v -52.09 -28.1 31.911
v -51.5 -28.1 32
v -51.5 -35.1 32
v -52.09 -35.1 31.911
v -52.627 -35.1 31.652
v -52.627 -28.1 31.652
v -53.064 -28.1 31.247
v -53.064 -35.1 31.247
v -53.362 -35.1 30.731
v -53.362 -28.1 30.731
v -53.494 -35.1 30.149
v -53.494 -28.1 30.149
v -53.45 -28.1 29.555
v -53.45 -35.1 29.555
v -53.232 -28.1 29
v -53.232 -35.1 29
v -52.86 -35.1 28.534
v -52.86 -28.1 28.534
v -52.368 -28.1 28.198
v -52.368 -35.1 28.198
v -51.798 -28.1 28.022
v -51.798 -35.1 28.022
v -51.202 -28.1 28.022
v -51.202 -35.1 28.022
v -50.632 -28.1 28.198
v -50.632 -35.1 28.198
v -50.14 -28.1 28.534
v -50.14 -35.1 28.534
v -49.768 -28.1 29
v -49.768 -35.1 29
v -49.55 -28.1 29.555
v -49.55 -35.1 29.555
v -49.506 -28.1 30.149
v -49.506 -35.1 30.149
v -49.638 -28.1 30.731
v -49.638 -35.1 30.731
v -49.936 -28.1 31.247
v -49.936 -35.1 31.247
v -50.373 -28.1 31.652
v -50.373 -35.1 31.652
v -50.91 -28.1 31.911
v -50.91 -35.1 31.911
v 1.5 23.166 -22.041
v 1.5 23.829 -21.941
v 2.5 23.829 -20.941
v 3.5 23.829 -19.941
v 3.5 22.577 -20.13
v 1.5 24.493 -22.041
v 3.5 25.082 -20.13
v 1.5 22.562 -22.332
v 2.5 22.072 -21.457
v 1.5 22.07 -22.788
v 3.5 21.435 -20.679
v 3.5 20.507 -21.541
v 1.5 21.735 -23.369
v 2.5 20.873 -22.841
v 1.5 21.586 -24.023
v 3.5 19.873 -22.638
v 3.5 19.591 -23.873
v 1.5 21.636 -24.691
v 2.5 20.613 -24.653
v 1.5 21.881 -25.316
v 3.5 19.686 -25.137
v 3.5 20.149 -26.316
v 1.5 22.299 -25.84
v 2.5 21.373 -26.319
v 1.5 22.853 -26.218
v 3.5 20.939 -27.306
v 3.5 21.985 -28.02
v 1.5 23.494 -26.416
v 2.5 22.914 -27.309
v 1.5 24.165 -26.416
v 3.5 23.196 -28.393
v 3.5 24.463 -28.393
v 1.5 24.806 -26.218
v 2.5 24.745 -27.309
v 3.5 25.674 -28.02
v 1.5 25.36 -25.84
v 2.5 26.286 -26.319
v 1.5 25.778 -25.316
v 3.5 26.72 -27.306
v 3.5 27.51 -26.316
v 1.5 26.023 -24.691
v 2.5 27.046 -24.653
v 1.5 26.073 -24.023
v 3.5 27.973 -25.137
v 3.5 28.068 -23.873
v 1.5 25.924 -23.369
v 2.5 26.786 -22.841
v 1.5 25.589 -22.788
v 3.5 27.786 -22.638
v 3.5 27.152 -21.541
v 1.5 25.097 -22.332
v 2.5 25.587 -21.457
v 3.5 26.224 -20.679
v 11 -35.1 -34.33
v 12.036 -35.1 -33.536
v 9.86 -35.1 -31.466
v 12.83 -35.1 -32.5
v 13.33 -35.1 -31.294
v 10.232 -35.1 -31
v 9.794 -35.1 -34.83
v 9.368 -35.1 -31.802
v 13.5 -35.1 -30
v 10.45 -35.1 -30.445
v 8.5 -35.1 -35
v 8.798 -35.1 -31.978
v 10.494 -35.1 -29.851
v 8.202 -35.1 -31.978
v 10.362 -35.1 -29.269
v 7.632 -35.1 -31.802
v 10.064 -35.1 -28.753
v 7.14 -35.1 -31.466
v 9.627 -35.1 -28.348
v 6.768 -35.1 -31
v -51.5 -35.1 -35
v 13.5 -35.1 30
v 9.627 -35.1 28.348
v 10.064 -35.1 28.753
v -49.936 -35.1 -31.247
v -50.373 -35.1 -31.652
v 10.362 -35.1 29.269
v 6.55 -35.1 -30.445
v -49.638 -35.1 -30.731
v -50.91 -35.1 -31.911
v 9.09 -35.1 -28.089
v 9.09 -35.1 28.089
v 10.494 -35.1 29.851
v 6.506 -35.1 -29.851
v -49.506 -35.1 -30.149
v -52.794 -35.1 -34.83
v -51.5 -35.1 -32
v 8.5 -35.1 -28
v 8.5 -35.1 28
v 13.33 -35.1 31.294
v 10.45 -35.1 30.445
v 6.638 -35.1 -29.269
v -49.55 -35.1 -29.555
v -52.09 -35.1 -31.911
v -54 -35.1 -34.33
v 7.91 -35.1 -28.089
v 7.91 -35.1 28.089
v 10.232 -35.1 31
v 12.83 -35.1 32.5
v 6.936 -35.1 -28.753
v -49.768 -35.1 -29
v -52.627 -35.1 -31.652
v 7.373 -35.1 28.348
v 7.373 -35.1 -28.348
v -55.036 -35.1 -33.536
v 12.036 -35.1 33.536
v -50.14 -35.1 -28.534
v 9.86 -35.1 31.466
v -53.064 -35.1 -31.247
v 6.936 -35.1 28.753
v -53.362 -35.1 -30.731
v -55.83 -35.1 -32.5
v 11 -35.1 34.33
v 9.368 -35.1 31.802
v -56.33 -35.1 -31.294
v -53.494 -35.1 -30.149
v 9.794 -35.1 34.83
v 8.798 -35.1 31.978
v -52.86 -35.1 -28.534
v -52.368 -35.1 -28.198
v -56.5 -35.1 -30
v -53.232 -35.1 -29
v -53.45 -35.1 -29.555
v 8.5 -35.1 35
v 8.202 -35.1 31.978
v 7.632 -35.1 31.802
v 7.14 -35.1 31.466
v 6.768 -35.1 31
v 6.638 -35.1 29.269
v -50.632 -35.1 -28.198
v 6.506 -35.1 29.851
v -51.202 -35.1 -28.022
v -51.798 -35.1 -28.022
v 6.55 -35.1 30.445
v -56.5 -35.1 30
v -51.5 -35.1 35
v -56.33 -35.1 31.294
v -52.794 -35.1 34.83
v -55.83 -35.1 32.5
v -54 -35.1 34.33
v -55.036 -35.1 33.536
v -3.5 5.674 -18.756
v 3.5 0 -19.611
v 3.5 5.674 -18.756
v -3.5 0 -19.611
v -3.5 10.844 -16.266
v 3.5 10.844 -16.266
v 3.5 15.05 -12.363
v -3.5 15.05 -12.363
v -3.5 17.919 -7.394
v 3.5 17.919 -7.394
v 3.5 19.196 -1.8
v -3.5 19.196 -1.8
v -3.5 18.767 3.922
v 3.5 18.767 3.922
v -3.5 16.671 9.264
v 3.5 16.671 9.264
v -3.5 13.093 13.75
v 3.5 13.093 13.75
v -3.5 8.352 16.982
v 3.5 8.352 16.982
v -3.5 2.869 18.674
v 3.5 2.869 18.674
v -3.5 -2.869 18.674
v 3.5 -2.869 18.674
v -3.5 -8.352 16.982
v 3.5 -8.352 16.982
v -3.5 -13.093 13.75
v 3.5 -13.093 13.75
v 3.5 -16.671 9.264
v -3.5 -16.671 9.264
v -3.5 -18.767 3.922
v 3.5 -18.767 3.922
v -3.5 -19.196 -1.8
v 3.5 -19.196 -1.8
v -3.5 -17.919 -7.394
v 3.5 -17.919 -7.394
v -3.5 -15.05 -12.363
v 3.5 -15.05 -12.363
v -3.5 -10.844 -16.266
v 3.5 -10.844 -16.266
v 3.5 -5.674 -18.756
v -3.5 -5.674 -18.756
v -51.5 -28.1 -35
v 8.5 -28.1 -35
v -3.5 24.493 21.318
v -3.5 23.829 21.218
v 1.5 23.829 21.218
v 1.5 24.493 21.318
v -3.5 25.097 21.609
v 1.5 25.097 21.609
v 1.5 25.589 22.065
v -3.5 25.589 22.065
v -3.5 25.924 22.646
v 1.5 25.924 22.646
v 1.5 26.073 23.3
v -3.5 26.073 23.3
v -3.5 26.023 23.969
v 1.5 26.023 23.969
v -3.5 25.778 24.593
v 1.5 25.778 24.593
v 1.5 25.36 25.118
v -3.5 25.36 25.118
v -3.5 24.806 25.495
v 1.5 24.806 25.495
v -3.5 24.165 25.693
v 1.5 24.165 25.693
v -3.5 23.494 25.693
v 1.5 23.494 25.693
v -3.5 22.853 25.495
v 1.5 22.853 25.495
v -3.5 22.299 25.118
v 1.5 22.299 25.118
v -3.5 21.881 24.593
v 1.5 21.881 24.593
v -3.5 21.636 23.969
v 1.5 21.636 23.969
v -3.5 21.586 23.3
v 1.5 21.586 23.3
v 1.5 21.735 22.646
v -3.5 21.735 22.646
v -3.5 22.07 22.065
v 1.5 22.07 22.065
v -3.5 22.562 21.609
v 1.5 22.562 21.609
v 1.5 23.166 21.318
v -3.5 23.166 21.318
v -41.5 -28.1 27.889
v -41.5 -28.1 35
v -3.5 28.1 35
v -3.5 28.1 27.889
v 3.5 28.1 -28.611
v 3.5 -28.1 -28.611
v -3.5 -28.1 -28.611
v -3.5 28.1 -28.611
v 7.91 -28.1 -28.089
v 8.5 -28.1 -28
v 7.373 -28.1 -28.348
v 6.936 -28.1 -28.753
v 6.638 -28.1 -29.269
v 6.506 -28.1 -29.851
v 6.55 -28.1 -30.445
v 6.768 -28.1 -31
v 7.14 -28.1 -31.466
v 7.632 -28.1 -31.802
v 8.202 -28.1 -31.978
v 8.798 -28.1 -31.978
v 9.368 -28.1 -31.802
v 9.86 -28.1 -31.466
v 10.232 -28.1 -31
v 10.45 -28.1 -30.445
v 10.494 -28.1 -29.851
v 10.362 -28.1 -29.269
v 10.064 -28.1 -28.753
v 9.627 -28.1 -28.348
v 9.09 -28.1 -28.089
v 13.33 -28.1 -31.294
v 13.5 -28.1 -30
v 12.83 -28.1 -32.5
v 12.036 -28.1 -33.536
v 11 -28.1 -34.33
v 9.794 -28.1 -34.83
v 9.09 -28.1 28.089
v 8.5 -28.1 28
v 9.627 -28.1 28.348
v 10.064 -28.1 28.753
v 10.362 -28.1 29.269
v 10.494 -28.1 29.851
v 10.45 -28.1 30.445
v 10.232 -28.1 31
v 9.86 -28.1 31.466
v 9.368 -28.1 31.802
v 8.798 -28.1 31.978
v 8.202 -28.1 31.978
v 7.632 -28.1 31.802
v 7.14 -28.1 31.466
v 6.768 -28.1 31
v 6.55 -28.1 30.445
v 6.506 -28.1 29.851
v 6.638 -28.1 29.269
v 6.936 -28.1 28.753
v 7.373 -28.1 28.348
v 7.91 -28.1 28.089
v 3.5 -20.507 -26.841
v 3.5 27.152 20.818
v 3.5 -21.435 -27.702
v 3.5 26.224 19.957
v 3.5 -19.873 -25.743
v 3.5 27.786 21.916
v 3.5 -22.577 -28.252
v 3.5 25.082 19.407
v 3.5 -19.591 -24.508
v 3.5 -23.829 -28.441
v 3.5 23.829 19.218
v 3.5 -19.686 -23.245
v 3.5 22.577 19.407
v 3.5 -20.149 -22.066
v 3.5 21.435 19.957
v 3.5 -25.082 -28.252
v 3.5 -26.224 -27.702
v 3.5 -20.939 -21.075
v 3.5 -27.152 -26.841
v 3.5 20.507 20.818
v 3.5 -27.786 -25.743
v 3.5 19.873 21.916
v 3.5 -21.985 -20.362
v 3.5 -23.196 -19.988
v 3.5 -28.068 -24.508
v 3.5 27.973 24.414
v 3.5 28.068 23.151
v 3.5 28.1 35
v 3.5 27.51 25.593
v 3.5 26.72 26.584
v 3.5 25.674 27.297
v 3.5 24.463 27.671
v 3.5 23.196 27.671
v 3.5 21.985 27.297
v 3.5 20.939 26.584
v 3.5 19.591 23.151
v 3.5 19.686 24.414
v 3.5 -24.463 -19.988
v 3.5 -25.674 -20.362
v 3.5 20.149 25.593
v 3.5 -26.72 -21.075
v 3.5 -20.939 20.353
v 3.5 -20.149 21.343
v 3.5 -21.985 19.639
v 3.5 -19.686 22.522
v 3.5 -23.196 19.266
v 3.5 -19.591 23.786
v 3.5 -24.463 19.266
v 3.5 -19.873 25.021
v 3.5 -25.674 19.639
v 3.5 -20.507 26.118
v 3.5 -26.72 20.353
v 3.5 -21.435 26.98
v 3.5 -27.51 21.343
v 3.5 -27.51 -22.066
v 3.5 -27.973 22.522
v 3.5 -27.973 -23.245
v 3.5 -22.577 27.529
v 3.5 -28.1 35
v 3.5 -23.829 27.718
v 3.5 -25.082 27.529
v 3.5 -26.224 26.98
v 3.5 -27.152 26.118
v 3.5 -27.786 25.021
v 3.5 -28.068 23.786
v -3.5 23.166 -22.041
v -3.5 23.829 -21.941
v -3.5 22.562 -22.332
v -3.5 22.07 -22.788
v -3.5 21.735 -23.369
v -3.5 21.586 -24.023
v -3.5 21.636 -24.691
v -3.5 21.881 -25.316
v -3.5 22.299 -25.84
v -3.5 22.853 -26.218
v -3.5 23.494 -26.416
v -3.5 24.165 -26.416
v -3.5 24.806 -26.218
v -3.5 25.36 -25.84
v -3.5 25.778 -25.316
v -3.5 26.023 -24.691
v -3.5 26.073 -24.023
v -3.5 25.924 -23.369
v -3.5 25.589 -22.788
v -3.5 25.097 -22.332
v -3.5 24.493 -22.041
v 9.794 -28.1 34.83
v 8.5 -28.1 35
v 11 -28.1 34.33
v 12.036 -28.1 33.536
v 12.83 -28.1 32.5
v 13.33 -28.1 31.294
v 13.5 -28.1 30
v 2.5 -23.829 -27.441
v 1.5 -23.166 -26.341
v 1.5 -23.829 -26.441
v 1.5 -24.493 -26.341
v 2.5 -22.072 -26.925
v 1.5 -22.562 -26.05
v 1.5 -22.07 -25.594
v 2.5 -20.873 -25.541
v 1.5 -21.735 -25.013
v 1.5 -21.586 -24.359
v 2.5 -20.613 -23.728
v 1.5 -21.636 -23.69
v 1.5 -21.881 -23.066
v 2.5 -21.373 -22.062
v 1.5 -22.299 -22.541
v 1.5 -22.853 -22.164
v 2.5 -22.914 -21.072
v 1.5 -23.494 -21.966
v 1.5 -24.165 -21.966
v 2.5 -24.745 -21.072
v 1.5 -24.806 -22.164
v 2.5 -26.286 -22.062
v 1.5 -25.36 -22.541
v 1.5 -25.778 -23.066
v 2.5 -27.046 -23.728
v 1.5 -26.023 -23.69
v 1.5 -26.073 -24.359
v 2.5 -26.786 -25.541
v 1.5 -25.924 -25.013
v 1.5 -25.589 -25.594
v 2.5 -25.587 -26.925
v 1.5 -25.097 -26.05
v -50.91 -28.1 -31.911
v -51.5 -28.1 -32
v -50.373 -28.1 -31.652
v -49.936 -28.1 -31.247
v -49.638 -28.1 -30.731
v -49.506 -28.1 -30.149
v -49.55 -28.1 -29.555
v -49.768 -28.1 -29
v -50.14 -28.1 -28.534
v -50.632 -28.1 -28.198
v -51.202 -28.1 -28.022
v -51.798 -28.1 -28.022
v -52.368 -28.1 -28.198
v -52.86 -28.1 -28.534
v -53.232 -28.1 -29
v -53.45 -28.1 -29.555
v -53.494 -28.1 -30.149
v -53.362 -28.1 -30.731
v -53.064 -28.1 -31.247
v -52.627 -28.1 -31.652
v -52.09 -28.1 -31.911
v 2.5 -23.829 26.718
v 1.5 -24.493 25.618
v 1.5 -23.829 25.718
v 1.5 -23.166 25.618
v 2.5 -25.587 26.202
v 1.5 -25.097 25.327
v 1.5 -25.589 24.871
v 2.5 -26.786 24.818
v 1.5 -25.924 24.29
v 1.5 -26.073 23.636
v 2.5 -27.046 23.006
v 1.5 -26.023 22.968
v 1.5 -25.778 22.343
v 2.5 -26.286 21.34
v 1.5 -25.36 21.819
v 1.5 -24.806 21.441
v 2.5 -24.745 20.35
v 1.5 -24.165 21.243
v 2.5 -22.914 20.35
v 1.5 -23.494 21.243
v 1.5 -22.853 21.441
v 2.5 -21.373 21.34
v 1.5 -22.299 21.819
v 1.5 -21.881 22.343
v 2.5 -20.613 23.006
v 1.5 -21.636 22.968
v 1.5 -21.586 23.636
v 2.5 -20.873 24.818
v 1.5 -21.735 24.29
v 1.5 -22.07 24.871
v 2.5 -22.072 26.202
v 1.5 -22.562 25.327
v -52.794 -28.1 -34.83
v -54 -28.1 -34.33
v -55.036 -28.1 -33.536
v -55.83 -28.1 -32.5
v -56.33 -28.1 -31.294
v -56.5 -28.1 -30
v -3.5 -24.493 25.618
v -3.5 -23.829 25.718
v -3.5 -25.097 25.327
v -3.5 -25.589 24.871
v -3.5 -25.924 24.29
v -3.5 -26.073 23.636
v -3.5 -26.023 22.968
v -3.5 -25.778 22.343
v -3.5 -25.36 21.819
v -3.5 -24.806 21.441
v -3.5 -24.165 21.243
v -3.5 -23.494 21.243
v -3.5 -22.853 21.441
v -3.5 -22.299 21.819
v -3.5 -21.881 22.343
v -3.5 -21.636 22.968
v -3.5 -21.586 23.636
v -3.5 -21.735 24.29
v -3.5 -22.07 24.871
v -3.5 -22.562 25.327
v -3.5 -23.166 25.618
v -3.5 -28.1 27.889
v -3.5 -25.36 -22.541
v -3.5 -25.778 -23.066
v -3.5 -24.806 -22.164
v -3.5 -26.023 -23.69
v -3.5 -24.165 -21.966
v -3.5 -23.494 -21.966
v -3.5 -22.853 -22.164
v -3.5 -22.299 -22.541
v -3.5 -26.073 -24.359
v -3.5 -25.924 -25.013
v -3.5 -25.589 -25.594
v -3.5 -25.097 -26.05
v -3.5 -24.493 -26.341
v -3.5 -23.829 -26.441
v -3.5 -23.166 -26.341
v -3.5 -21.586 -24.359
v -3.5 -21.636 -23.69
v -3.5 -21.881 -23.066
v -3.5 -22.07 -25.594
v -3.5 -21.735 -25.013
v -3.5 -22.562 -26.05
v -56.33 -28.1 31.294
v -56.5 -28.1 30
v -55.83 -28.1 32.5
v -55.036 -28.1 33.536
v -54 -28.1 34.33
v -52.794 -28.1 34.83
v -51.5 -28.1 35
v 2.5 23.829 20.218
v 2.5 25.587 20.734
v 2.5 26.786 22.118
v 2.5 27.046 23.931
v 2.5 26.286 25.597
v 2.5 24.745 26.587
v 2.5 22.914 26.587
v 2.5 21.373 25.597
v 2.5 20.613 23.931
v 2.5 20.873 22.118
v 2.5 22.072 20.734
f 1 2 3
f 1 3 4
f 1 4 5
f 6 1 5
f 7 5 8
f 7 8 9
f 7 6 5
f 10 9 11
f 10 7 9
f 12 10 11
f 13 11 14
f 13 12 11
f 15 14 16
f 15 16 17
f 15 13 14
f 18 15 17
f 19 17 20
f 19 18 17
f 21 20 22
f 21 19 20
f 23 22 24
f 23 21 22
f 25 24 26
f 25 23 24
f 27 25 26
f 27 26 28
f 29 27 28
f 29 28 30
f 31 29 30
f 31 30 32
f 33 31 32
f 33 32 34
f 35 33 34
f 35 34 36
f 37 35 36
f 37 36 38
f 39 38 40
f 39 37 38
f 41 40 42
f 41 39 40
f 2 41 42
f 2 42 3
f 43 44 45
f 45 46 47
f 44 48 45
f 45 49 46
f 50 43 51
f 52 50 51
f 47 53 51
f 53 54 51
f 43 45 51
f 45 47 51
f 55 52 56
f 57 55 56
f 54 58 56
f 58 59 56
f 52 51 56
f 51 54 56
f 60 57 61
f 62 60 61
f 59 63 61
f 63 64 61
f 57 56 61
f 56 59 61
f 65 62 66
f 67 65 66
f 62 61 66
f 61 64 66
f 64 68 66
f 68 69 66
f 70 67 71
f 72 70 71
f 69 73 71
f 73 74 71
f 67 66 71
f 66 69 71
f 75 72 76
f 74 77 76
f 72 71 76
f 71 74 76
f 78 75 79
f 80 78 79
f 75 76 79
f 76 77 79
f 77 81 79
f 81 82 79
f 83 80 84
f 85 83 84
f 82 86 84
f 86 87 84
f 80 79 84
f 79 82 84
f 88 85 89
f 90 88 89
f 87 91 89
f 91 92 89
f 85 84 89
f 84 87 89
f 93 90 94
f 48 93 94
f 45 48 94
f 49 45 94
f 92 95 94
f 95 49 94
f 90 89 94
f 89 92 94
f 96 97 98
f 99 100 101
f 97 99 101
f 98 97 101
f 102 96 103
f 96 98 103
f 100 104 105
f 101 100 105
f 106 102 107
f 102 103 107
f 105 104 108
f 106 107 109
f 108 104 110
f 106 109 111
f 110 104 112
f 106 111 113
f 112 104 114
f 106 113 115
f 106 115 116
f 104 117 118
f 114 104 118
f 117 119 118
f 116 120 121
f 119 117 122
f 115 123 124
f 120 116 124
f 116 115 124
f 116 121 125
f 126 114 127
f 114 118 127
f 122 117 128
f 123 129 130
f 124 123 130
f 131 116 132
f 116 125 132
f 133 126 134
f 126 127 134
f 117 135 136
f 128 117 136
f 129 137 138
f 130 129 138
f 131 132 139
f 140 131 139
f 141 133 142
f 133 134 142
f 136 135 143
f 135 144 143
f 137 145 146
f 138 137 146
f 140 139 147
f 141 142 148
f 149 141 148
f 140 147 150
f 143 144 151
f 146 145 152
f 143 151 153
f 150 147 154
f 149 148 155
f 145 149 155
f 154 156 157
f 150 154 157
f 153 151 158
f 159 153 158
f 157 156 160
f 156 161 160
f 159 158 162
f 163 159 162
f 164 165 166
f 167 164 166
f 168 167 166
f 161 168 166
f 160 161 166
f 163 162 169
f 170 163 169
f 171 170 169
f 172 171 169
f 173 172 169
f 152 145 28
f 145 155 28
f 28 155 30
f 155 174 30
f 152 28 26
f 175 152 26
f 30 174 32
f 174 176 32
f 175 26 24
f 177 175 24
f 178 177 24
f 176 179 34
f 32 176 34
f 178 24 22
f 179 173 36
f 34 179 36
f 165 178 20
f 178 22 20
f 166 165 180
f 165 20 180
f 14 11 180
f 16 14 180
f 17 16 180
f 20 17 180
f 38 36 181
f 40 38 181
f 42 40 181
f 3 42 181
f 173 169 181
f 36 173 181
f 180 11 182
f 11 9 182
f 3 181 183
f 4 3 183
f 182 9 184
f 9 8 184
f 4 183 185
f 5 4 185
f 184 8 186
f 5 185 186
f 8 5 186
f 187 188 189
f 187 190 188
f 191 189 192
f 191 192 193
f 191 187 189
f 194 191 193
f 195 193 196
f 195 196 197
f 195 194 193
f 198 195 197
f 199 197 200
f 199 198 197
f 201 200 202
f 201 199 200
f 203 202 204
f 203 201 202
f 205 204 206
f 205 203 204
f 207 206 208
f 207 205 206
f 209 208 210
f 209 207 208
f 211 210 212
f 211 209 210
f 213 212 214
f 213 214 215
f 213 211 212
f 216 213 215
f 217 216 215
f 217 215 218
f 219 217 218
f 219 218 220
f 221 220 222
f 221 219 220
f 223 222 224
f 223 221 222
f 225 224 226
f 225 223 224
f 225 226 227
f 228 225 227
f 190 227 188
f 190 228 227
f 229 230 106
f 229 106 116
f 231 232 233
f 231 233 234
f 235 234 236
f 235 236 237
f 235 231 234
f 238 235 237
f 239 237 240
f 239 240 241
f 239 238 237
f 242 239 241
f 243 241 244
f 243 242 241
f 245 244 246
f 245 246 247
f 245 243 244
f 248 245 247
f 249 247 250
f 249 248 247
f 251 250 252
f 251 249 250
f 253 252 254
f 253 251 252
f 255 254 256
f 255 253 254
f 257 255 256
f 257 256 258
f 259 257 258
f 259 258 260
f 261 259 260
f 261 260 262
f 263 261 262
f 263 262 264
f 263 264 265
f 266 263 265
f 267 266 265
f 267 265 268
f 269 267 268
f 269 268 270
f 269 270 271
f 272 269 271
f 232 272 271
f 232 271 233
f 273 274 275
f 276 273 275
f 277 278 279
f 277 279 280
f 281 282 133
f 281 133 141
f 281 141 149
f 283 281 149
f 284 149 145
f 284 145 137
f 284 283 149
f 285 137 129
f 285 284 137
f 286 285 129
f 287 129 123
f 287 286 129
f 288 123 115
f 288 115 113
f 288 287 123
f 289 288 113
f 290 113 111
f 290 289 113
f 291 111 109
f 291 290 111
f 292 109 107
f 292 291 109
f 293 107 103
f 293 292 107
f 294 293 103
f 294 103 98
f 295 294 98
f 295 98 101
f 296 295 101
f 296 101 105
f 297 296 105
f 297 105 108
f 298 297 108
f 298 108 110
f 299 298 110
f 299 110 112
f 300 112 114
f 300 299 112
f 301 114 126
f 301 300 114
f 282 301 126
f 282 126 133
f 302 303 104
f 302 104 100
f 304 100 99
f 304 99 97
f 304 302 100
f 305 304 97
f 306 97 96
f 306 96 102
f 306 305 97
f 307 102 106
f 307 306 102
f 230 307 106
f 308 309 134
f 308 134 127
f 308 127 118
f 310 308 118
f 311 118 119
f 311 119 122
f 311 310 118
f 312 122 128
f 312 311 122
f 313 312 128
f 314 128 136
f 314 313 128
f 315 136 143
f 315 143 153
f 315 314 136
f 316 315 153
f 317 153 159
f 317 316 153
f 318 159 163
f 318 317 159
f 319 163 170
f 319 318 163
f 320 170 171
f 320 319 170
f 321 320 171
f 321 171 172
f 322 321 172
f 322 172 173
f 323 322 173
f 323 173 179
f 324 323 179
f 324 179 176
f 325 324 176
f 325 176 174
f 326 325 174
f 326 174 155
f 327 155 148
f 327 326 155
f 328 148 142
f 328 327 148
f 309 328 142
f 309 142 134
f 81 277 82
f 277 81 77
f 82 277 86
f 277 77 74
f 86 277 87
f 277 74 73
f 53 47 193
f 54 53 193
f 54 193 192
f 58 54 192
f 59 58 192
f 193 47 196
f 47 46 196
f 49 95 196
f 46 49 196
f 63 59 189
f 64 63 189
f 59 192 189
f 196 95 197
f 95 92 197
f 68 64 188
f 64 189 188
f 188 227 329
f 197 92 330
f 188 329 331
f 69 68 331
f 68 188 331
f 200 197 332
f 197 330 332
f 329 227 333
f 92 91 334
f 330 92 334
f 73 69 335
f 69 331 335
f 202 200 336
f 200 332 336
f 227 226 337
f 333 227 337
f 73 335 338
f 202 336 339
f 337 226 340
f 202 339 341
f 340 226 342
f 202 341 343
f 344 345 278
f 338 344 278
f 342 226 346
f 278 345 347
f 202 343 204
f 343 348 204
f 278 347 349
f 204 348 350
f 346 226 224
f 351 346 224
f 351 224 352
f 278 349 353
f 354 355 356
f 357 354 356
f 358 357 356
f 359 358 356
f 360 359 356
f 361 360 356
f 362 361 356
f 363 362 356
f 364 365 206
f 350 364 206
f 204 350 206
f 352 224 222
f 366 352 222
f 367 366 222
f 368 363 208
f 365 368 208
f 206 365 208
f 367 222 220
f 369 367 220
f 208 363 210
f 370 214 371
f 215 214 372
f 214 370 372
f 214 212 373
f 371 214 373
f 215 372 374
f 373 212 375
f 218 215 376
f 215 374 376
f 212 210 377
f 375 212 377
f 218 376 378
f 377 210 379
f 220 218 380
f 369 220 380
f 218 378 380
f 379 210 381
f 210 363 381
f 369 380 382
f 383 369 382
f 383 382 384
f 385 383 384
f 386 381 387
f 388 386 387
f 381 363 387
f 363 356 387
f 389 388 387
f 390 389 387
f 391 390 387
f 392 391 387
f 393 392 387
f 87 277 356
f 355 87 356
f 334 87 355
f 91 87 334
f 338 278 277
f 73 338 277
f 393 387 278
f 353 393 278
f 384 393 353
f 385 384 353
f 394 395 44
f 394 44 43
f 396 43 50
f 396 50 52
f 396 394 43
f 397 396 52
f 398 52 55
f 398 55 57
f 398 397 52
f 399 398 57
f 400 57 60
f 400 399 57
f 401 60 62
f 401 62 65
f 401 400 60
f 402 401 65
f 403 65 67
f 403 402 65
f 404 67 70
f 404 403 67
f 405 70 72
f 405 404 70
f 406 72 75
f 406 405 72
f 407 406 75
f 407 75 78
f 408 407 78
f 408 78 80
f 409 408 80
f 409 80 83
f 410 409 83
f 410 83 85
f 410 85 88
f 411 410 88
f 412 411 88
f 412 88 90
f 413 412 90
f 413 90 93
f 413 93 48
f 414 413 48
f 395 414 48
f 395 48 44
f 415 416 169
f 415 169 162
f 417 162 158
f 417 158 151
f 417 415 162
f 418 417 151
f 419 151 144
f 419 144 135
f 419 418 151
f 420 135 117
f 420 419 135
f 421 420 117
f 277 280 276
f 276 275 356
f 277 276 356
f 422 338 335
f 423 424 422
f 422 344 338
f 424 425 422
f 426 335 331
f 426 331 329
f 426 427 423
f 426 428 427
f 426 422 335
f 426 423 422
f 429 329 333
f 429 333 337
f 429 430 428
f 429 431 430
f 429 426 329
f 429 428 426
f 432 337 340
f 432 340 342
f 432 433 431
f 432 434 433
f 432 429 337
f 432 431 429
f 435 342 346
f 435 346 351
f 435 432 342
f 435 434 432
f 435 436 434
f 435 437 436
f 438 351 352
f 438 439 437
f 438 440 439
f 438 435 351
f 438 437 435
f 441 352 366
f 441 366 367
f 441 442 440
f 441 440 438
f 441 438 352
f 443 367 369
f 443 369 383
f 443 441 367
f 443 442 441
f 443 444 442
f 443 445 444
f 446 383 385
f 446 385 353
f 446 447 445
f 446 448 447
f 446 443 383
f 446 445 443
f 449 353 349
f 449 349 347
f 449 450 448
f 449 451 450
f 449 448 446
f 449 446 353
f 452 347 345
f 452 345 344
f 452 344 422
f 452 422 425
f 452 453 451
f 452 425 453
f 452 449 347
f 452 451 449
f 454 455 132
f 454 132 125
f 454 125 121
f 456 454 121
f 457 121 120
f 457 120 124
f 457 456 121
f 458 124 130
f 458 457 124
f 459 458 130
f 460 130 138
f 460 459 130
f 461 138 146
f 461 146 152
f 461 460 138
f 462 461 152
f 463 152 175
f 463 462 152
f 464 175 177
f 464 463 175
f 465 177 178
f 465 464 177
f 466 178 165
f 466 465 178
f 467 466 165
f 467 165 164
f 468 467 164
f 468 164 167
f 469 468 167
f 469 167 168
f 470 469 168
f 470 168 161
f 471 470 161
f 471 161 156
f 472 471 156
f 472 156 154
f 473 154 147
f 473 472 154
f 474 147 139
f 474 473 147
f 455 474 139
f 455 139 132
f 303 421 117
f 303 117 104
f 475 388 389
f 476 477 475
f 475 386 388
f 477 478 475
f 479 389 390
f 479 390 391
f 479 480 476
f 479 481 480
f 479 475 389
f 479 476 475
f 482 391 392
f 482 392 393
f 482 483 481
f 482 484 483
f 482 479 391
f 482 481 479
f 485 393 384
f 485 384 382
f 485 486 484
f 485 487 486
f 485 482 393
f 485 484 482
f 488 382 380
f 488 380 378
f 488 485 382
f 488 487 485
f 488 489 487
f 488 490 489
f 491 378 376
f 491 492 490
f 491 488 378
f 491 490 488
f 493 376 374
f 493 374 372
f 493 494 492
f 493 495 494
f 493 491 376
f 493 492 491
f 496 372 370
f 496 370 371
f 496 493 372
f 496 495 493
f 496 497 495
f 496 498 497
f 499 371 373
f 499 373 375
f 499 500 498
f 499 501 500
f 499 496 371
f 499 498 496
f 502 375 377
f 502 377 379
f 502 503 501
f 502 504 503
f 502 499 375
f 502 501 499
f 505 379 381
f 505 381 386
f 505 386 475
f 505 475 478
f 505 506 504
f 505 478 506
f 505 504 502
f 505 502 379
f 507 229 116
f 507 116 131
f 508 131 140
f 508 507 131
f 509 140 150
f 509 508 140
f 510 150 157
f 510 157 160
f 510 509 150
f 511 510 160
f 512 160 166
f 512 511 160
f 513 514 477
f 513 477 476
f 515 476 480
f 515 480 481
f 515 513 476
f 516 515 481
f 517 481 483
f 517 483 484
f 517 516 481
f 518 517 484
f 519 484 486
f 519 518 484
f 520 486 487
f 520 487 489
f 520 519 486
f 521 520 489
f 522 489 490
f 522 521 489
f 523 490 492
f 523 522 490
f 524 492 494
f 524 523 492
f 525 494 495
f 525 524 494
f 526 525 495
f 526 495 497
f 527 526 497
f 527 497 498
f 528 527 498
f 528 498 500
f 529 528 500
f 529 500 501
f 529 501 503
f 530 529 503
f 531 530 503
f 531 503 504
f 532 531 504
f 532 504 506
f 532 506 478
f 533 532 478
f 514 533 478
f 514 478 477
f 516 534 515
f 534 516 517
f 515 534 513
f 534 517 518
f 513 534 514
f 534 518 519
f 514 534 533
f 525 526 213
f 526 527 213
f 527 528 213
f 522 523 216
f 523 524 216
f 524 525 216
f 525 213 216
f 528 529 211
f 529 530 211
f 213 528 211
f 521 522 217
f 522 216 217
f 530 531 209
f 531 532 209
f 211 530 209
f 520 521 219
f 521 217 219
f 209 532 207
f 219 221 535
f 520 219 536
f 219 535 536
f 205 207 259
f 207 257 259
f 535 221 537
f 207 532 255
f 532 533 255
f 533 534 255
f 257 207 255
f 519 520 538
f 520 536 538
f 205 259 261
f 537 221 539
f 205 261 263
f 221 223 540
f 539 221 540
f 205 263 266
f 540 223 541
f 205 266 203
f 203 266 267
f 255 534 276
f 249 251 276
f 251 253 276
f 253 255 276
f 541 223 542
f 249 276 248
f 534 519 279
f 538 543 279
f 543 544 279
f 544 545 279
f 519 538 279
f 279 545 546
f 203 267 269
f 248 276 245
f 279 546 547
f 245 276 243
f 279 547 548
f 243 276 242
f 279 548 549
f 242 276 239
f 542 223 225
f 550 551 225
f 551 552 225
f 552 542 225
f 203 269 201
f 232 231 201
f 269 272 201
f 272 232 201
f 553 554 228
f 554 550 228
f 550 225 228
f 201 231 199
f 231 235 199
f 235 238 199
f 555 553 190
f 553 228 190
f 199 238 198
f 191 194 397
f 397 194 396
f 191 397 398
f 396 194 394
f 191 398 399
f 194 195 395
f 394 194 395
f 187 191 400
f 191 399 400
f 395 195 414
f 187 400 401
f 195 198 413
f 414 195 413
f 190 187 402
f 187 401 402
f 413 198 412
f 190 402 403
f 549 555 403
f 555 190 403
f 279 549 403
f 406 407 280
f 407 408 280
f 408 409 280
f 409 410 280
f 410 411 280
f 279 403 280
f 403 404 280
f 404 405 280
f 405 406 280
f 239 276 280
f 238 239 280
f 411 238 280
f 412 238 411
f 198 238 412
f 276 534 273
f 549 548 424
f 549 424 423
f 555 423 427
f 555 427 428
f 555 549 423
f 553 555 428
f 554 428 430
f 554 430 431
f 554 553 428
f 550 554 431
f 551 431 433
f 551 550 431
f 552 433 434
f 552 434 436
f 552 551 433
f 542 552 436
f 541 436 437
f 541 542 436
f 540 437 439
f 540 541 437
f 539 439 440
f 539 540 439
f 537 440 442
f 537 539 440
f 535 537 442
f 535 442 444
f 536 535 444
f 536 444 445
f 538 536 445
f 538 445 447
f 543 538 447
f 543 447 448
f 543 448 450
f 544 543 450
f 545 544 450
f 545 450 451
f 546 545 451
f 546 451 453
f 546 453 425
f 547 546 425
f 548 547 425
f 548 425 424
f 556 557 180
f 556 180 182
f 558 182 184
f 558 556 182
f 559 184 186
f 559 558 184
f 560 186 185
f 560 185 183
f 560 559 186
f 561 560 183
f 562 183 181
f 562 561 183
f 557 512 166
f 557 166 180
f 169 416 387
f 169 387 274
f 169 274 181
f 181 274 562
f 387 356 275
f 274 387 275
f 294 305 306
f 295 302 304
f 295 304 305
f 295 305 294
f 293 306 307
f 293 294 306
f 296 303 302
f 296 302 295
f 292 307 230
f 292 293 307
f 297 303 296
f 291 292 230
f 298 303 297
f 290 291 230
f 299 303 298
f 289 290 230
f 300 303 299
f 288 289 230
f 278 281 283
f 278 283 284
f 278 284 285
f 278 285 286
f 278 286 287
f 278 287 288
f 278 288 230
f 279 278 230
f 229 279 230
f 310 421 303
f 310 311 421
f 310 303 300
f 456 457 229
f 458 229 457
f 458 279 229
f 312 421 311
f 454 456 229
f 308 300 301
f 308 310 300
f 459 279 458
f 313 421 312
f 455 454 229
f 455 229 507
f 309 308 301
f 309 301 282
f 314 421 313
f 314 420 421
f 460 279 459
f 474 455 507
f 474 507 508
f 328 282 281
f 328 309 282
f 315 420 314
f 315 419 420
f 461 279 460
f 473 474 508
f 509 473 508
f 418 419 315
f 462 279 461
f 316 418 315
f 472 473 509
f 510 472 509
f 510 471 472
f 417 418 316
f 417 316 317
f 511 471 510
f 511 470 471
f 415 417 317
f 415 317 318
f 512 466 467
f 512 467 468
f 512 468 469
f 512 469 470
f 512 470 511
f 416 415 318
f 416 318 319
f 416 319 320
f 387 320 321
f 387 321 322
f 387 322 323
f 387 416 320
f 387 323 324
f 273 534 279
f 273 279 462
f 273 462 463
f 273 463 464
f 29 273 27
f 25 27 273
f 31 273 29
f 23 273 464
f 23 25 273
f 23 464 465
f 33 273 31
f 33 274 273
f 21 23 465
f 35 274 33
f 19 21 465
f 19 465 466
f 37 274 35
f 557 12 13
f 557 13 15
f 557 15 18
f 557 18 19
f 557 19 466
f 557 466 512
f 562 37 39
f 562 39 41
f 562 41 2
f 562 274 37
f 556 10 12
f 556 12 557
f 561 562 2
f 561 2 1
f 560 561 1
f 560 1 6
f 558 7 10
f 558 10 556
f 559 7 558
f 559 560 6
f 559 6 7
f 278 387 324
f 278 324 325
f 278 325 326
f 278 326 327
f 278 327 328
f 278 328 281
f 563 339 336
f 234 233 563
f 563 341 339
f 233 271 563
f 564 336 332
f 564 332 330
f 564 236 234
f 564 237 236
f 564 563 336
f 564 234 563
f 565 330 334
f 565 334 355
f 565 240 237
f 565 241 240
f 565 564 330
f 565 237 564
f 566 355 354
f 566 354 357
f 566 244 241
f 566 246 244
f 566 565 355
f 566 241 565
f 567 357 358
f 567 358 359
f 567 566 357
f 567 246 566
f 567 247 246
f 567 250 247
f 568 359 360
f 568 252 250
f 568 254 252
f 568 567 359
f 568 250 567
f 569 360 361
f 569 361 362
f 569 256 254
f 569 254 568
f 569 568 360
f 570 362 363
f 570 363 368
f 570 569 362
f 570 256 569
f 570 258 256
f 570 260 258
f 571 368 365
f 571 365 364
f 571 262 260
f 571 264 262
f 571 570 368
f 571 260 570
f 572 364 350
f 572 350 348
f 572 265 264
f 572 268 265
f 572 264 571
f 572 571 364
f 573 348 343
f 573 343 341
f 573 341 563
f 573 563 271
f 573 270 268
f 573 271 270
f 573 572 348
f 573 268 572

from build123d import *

# Parameters (mm, degrees)
SKETCH1_W           = 56.5
SKETCH1_H           = 56.2
SKETCH1_R           = 19.25
SKETCH1_R_2         = 2.25
BOSS_EXTRUDE1_DEPTH = 3.5
SKETCH2_R           = 2
BOSS_EXTRUDE2_DEPTH = 7
BOSS_EXTRUDE3_START = 35
BOSS_EXTRUDE3_DEPTH = 7.11128839
CHAMFER1_SIZE       = 2


with BuildPart() as part:
    # Sketch1 → Boss-Extrude1 (new, symmetric)
    with BuildSketch(Plane(origin=(0, 0, 0), x_dir=(0, 0, -1), z_dir=(1, 0, 0))):
        with Locations((0.36128839, 0)):
            Rectangle(SKETCH1_W, SKETCH1_H)
        with Locations((0.36128839, 0)):
            Circle(SKETCH1_R, mode=Mode.SUBTRACT)
        with Locations((-23.468210136, 23.829498526)):
            Circle(SKETCH1_R_2, mode=Mode.SUBTRACT)
        with Locations(Location((24.190786916, 23.829498526, 0), (0, 0, 180))):
            Circle(SKETCH1_R_2, mode=Mode.SUBTRACT)
        with Locations((24.190786916, -23.829498526)):
            Circle(SKETCH1_R_2, mode=Mode.SUBTRACT)
        with Locations(Location((-23.468210136, -23.829498526, 0), (0, 0, 180))):
            Circle(SKETCH1_R_2, mode=Mode.SUBTRACT)
    extrude(amount=BOSS_EXTRUDE1_DEPTH, both=True)

    # Sketch2 → Boss-Extrude2 (add)
    with BuildSketch(Plane.XZ.offset(28.1)):
        with BuildLine():
            Line((-51.5, 35), (8.5, 35))
            ThreePointArc((8.5, 35), (12.035533906, 33.535533906), (13.5, 30))
            Line((13.5, 30), (13.5, -30))
            ThreePointArc((13.5, -30), (12.035533906, -33.535533906), (8.5, -35))
            Line((8.5, -35), (-51.5, -35))
            ThreePointArc((-51.5, -35), (-55.035533906, -33.535533906), (-56.5, -30))
            Line((-56.5, -30), (-56.5, 30))
            ThreePointArc((-56.5, 30), (-55.035533906, 33.535533906), (-51.5, 35))
        make_face()
        with Locations(Location((8.5, 30, 0), (0, 0, 270))):
            Circle(SKETCH2_R, mode=Mode.SUBTRACT)
        with Locations(Location((8.5, -30, 0), (0, 0, 90))):
            Circle(SKETCH2_R, mode=Mode.SUBTRACT)
        with Locations(Location((-51.5, 30, 0), (0, 0, 90))):
            Circle(SKETCH2_R, mode=Mode.SUBTRACT)
        with Locations(Location((-51.5, -30, 0), (0, 0, 270))):
            Circle(SKETCH2_R, mode=Mode.SUBTRACT)
    extrude(amount=BOSS_EXTRUDE2_DEPTH)

    # Sketch4 → Boss-Extrude3 (add)
    with BuildSketch(Plane.XY.offset(BOSS_EXTRUDE3_START)):
        Polygon((-41.5, -28.1), (-3.5, 28.1), (3.5, 28.1), (3.5, -28.1), align=None)
    extrude(amount=-BOSS_EXTRUDE3_DEPTH)

    # Chamfer1
    chamfer1_edges = [part.edges().sort_by_distance(p)[0] for p in [
        (3.5, 23.829498526, 25.718210136),
        (3.5, 23.829498526, -26.440786916),
        (3.5, -23.829498526, -21.940786916),
        (3.5, -23.829498526, 21.218210136),
    ]]
    chamfer(chamfer1_edges, length=CHAMFER1_SIZE)


solid = part.part
